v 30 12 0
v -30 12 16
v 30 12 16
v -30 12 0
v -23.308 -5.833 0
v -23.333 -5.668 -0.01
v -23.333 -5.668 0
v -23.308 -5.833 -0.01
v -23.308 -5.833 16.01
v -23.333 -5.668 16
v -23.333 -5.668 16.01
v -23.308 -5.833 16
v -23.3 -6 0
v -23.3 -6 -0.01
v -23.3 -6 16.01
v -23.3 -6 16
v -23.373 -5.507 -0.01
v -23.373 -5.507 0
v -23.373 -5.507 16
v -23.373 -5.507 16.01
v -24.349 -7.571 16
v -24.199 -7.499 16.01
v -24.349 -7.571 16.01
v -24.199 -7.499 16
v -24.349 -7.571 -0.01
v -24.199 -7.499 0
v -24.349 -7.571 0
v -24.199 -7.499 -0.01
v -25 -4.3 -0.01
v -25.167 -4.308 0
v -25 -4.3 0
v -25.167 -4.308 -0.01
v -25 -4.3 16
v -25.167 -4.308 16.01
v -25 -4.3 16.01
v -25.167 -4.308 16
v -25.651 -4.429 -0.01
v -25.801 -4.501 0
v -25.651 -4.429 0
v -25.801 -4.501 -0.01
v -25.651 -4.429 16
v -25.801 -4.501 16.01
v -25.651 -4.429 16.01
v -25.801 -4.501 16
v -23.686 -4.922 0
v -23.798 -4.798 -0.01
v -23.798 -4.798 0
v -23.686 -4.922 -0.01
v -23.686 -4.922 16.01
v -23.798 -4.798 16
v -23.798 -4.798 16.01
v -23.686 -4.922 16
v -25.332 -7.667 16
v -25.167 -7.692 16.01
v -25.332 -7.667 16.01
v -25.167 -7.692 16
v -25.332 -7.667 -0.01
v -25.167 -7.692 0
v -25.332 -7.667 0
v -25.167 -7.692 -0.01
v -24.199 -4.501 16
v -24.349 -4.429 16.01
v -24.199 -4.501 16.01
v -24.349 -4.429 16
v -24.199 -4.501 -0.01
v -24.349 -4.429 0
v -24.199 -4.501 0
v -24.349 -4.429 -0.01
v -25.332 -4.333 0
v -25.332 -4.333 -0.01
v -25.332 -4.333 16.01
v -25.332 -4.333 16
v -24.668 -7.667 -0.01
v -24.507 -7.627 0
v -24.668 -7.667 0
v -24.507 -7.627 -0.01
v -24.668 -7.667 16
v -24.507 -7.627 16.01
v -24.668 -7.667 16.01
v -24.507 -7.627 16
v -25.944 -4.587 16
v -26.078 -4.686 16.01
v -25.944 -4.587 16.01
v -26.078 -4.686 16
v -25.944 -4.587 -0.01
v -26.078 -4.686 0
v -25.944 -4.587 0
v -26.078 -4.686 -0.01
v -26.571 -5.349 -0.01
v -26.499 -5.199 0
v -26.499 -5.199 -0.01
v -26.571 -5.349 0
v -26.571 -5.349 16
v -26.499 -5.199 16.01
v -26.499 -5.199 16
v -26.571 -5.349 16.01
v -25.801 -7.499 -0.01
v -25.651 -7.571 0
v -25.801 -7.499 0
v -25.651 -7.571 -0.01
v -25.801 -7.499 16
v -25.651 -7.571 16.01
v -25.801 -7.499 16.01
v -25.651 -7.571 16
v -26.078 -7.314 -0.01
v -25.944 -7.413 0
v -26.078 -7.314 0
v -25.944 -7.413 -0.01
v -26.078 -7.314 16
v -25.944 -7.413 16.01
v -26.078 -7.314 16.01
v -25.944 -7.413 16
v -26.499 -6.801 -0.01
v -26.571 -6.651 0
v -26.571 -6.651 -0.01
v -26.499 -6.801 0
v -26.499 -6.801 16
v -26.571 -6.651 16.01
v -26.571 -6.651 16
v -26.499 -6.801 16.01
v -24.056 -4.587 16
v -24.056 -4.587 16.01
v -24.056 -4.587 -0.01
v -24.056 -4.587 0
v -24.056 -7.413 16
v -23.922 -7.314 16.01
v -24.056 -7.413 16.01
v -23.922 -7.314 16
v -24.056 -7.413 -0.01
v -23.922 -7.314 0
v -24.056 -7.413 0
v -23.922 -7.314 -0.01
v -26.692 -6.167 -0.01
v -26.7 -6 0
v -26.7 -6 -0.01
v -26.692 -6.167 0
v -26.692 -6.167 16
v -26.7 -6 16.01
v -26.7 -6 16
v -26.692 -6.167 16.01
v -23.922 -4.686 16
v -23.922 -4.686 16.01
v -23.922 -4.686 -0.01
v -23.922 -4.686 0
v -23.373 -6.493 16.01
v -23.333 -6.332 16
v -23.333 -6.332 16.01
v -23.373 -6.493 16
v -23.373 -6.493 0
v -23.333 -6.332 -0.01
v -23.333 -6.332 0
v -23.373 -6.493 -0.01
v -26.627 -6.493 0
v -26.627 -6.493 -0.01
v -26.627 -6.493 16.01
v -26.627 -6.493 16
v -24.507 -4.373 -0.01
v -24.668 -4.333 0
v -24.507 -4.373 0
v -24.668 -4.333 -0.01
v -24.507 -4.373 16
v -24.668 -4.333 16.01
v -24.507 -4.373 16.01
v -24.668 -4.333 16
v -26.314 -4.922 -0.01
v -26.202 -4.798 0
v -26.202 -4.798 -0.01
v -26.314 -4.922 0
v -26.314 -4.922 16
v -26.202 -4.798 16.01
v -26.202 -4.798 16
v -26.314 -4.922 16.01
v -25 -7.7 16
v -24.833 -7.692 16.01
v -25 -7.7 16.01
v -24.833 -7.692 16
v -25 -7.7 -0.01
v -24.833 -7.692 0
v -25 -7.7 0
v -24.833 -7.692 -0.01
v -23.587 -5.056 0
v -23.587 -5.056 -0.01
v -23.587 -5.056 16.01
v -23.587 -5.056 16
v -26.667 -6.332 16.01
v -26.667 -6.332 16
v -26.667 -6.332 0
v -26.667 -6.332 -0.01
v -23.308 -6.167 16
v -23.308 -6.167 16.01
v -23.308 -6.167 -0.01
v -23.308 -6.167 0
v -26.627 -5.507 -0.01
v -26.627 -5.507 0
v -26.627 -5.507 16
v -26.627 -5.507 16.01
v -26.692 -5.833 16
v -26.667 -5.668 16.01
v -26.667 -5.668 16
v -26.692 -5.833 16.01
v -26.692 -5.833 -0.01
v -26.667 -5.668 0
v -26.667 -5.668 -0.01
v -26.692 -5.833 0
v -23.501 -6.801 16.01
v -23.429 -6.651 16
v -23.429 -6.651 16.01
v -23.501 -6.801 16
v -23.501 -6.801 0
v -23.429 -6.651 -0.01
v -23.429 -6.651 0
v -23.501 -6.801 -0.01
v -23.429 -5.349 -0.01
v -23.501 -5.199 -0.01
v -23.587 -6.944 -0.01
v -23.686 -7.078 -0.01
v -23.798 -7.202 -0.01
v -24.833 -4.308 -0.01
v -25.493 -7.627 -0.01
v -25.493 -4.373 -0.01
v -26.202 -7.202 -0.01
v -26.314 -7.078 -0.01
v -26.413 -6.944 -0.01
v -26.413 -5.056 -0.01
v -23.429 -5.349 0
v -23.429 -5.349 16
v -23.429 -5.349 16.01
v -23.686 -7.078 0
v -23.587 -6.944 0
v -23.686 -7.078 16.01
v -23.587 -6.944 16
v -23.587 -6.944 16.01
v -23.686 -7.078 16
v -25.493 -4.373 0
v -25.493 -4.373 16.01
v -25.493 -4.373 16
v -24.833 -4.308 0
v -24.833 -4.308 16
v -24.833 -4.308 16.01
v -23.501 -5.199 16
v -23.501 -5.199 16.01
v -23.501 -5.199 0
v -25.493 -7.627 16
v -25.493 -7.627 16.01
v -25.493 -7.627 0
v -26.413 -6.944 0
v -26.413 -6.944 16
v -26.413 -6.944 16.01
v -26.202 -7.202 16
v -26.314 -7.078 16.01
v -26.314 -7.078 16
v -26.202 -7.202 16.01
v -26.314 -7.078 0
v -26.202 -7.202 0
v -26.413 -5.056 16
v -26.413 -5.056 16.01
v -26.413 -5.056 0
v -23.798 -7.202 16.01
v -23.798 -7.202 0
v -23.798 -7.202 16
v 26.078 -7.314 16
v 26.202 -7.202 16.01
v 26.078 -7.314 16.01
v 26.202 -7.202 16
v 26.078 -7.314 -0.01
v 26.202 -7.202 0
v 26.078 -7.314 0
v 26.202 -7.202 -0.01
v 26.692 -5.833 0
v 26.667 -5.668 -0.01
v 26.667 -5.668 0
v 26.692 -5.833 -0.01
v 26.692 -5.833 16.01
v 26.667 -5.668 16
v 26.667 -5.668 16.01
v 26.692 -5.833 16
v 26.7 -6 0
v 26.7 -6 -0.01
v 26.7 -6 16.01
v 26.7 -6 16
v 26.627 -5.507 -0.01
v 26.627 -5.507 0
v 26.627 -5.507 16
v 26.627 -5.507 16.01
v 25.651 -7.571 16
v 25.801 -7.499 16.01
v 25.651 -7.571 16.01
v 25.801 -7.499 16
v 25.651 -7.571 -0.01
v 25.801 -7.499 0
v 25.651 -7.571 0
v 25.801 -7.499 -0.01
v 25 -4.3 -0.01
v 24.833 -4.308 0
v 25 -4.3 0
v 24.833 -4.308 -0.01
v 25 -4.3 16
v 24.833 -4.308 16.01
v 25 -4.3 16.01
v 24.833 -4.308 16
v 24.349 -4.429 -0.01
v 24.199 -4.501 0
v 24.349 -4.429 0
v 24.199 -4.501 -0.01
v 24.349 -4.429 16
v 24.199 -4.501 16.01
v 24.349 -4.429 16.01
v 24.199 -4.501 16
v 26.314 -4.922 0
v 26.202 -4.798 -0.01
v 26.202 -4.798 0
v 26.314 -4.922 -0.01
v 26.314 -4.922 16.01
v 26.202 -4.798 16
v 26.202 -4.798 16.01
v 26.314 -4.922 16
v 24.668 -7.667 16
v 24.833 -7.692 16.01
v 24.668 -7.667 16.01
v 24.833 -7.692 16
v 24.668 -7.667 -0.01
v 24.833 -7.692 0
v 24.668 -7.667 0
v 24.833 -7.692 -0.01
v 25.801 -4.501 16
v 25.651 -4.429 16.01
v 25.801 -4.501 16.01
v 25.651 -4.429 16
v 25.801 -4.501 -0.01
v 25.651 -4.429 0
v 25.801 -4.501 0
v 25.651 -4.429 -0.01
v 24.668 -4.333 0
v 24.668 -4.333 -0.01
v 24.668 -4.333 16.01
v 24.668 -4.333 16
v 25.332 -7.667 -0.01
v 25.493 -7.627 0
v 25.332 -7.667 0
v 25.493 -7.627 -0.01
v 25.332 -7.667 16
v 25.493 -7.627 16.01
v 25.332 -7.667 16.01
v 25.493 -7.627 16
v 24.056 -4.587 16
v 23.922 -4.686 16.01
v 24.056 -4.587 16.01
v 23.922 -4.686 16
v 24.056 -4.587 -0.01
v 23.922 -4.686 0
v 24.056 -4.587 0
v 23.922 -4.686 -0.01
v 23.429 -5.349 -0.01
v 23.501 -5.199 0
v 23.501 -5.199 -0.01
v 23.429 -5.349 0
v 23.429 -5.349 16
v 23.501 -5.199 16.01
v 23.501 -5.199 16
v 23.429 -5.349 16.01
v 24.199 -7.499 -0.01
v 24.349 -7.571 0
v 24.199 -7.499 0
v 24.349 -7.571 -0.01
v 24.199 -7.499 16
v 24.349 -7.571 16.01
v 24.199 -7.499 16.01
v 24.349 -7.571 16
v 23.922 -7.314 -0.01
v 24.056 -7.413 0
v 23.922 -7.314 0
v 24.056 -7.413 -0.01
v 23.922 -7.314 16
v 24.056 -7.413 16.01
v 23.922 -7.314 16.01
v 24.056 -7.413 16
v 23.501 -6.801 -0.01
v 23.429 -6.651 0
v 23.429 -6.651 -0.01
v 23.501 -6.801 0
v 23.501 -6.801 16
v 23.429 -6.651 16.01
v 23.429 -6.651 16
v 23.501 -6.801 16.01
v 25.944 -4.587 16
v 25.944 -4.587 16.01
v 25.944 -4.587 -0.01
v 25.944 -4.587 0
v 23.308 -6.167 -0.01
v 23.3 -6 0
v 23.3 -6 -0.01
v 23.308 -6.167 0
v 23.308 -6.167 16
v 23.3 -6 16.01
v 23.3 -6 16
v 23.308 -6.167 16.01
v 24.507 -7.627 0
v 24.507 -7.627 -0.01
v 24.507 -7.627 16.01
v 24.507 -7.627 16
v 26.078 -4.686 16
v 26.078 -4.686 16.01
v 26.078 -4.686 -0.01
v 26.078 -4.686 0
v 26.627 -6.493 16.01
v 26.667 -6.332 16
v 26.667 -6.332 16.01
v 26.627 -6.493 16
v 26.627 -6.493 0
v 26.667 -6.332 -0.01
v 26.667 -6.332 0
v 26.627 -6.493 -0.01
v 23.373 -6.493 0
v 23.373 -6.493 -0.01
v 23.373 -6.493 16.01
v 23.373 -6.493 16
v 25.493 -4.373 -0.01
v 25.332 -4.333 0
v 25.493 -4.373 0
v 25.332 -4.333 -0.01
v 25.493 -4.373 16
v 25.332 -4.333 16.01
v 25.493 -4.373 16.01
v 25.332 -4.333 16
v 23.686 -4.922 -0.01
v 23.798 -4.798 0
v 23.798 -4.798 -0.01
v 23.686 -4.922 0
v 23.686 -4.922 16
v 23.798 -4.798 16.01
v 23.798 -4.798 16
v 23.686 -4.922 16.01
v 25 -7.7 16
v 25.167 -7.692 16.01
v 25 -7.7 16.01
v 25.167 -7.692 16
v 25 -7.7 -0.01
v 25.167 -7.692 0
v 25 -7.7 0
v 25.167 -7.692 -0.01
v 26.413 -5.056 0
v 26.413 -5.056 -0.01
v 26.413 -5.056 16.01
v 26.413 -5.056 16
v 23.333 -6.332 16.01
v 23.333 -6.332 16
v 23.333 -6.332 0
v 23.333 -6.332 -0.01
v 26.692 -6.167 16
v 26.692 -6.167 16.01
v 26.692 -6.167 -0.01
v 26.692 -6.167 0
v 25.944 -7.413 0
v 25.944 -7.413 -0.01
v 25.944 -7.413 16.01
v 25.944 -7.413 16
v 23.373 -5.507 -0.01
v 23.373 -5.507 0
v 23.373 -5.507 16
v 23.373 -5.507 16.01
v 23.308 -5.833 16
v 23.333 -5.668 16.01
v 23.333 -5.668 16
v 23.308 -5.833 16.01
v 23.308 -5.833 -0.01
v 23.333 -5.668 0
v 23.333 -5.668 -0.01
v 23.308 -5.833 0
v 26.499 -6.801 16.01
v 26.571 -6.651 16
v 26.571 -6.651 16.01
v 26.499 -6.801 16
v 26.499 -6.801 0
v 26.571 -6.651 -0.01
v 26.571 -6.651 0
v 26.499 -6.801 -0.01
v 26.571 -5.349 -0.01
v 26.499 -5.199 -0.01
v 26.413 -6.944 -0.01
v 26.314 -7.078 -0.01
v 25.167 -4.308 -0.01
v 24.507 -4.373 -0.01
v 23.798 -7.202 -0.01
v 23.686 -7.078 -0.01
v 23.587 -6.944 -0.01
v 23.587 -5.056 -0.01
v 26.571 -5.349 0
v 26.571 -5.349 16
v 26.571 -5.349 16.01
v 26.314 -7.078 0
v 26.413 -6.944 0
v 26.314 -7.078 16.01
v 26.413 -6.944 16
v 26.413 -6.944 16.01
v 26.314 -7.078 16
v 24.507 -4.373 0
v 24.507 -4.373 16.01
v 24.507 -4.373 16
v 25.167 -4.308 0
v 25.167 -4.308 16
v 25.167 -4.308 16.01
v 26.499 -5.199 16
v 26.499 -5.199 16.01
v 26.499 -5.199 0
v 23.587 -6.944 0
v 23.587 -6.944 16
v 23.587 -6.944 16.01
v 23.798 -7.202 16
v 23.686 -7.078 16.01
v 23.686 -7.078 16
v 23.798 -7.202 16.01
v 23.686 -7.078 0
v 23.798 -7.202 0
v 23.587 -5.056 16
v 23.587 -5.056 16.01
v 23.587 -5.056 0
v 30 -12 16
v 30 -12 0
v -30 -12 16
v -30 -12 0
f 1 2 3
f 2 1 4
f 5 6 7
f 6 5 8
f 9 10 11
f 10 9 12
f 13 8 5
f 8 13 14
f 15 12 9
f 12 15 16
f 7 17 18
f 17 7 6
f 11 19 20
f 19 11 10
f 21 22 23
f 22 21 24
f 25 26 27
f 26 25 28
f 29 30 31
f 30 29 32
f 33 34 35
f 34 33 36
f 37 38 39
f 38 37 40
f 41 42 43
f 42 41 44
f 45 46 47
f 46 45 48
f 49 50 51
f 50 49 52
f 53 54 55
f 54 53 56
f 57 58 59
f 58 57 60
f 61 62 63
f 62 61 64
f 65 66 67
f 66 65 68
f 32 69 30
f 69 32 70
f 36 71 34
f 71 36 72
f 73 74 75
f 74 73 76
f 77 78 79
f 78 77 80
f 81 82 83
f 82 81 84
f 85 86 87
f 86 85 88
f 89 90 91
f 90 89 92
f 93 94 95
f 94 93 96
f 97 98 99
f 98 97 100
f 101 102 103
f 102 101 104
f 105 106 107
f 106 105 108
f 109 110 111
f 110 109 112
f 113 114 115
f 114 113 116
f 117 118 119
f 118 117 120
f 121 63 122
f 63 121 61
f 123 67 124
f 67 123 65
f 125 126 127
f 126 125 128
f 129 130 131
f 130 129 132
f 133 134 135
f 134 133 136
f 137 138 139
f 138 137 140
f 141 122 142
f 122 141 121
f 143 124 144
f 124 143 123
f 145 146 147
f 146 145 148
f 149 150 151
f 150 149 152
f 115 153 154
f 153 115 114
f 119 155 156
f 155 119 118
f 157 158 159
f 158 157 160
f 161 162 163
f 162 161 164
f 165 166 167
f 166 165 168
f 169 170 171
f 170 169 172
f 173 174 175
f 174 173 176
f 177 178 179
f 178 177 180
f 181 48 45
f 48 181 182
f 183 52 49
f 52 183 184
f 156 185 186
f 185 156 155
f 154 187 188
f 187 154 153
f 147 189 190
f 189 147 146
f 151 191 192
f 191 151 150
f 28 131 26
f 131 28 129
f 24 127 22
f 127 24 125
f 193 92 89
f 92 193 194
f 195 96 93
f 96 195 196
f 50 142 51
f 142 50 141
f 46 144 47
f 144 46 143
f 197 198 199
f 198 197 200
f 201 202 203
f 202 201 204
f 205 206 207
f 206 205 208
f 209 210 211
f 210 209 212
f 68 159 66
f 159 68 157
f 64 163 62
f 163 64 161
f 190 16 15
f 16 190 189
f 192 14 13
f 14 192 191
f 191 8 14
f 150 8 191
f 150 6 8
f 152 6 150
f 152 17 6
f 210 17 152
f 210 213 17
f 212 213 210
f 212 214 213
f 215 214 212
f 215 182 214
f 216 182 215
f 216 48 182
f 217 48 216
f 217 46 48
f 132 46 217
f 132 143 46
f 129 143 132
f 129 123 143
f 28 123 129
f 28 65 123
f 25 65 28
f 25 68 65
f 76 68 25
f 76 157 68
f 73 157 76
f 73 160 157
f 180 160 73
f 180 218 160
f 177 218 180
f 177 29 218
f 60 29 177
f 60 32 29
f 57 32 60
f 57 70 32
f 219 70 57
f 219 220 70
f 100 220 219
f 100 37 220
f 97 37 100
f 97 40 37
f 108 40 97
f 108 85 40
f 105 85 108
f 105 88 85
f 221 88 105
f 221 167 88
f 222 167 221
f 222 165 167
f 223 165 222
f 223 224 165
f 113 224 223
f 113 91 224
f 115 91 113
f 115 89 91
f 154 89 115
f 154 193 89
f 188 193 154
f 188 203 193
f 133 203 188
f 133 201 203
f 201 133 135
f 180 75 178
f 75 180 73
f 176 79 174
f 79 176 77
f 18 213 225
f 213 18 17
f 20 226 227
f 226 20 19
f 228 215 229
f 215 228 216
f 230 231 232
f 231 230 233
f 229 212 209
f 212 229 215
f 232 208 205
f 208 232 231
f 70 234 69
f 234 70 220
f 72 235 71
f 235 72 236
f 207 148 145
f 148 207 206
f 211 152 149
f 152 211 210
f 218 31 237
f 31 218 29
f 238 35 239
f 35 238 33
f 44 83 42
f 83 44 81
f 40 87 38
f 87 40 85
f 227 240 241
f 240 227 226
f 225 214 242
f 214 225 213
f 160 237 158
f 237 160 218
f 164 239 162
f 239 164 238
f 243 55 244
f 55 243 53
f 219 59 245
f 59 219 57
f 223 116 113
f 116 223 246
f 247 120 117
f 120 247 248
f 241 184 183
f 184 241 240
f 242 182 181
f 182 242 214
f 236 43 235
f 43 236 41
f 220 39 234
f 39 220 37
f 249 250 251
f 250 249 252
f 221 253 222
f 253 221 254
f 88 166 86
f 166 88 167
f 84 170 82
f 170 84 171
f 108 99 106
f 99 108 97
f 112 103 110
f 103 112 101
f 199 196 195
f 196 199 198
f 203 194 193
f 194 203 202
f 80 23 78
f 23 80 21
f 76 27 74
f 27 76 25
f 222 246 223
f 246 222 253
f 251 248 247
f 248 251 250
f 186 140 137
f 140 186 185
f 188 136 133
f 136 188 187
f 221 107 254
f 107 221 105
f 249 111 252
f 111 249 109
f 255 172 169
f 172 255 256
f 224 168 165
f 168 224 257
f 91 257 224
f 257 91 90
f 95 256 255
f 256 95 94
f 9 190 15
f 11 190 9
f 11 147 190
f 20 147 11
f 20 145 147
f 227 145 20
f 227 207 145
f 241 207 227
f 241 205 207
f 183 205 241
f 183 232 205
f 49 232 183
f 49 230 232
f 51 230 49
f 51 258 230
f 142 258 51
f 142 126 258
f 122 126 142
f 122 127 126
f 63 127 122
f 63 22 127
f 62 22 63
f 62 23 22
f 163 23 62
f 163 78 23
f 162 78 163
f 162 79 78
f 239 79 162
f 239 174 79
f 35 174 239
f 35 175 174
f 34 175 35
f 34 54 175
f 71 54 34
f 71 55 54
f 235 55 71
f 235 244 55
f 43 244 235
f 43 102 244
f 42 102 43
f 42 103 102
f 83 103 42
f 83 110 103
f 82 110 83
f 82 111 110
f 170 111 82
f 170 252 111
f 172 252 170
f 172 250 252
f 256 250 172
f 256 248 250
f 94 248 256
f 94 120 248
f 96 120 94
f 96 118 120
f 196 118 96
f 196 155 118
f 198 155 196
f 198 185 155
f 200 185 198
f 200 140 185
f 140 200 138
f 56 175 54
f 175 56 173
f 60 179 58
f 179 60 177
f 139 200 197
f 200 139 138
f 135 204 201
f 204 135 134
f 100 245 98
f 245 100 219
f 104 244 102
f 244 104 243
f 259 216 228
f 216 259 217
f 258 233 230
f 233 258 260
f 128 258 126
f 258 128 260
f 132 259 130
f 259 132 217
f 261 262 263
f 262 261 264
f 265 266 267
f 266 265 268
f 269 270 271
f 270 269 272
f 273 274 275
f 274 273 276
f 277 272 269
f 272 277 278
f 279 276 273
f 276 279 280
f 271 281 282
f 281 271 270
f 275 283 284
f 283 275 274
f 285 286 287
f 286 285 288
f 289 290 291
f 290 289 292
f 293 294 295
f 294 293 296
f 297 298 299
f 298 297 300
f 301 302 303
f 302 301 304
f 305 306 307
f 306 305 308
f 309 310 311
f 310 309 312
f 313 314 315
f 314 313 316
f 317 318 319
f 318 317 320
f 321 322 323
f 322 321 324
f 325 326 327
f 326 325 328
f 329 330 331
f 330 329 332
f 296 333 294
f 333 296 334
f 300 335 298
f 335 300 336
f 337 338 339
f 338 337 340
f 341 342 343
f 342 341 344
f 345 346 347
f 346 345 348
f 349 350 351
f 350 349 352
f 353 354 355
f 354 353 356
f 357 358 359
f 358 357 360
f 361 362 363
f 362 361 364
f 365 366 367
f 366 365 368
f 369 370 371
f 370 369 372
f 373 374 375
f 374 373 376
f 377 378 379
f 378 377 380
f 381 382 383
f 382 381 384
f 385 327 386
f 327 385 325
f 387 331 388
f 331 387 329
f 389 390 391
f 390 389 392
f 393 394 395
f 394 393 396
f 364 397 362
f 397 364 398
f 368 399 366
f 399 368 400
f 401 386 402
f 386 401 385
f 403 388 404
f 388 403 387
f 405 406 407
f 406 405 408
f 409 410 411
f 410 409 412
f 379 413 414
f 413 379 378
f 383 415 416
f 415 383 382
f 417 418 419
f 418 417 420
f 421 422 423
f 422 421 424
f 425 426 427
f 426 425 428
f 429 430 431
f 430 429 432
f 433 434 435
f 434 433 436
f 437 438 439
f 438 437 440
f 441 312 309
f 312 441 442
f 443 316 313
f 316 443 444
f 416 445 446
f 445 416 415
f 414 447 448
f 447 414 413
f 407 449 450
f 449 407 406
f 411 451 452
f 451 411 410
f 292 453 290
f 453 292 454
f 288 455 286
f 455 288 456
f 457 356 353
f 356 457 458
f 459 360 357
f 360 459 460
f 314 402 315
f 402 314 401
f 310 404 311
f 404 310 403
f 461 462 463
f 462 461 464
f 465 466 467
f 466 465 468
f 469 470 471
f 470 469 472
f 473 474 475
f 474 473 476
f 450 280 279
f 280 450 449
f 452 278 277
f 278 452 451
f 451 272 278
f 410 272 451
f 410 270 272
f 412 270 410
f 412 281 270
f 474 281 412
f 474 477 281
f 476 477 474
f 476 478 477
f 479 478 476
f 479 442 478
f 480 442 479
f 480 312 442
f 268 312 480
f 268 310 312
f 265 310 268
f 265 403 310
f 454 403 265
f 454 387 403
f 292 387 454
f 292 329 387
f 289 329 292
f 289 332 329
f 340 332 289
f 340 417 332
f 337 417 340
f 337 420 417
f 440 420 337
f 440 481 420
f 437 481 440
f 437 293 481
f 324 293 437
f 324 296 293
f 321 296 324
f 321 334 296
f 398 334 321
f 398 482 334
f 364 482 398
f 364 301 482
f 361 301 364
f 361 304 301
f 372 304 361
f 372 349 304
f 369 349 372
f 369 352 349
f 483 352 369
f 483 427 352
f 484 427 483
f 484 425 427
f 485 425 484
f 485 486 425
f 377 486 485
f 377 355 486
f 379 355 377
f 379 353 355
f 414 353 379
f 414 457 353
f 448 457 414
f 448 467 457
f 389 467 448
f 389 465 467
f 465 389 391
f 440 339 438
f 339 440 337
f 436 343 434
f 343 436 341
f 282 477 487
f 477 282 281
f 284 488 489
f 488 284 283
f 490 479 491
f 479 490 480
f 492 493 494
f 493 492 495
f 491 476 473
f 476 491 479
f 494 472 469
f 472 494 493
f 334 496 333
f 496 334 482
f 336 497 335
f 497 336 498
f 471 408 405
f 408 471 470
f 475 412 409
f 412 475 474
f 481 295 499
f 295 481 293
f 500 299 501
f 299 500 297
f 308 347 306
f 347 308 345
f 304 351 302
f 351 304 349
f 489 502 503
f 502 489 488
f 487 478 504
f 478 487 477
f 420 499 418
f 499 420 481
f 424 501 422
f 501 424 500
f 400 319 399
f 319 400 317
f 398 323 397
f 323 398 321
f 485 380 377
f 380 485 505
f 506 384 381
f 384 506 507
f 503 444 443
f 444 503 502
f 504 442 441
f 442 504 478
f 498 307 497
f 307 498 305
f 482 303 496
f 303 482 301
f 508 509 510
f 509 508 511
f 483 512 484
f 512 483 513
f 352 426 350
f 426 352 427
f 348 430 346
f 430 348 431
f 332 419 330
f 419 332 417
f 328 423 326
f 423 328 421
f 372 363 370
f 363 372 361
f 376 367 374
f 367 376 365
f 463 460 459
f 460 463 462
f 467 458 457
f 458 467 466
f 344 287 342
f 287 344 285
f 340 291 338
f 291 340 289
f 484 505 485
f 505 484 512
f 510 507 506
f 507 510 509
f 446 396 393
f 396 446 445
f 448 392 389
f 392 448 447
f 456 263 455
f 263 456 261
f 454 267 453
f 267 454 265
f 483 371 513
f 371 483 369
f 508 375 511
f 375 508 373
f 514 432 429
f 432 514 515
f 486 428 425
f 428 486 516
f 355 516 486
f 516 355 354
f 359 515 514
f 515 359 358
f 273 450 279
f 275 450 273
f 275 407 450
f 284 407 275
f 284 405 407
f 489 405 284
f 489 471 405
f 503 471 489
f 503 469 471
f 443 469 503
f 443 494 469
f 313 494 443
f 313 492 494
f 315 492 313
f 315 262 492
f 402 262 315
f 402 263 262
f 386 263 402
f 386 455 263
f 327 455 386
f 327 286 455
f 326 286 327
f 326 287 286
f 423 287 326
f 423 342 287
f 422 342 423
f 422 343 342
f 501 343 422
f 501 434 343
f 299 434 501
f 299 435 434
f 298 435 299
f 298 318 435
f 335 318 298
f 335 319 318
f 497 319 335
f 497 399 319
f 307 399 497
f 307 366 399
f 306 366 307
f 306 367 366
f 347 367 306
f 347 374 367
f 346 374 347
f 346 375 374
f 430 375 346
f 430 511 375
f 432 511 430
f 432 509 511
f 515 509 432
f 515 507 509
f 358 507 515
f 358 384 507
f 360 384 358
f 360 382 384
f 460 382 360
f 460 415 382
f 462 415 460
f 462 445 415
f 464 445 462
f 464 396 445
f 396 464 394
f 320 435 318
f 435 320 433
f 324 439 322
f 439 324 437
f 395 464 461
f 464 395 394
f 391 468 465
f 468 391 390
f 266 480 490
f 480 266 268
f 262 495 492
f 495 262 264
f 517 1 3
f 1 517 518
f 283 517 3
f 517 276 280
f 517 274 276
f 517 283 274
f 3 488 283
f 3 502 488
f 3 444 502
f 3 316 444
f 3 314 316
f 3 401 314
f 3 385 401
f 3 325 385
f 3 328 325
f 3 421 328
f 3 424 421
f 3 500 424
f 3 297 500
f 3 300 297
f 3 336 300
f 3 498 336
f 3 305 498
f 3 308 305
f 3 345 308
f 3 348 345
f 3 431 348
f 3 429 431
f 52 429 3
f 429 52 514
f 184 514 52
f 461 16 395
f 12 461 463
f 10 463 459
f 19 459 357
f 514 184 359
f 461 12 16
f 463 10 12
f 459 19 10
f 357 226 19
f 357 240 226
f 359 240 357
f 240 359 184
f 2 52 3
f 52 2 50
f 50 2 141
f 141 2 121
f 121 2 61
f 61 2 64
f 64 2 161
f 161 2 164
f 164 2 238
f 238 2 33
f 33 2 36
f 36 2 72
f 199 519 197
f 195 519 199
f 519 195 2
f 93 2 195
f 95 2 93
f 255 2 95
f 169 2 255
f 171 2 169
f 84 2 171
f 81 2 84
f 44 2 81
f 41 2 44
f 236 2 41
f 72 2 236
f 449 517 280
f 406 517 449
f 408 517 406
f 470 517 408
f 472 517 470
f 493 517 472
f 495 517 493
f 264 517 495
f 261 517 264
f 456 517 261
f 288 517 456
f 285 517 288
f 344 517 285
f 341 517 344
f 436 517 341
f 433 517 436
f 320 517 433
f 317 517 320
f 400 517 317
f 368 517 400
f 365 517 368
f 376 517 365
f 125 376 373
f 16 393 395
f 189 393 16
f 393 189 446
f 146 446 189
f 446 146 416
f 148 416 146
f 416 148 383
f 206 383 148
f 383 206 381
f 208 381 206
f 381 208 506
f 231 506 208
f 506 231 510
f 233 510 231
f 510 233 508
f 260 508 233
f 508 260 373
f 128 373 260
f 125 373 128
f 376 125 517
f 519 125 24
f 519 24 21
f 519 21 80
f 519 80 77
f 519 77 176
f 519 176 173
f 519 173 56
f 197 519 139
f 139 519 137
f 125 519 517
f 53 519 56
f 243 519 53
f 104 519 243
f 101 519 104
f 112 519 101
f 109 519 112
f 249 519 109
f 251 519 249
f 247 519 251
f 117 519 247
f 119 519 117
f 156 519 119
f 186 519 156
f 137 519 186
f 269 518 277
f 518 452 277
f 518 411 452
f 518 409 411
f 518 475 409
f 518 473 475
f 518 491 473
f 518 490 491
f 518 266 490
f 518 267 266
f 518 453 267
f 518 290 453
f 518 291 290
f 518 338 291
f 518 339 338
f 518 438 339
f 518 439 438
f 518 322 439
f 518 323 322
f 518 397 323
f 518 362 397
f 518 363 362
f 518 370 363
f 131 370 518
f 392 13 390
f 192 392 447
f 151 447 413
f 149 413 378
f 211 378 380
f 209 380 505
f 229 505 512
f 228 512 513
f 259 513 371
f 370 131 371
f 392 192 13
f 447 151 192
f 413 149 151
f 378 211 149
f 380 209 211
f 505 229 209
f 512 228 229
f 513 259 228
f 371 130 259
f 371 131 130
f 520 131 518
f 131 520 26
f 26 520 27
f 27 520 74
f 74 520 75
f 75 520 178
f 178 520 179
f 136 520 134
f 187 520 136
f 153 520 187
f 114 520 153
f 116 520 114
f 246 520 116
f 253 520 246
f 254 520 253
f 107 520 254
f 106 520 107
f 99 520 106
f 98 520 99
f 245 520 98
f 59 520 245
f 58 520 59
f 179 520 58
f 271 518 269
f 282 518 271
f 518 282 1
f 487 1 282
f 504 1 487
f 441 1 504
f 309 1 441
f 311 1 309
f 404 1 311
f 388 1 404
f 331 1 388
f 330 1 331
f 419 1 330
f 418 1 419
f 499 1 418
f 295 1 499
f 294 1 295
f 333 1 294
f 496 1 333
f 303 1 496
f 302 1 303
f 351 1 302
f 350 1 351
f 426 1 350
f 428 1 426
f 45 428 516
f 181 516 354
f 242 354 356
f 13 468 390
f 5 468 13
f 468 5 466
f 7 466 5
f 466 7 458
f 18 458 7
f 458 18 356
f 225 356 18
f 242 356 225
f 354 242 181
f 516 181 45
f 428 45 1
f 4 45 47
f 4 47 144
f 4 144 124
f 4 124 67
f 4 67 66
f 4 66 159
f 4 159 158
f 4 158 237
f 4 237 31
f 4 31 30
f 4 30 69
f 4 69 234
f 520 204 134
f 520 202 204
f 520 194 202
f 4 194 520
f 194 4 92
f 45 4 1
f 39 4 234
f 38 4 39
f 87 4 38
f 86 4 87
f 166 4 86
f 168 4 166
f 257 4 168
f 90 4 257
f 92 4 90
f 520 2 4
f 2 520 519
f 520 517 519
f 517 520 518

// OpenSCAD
// Manifold Block: 1-to-3 Splitter
// Dimensions measured in mm

// Block dimensions
block_len = 60;   // X
block_wid = 24;   // Y
block_hgt = 16;   // Z

// Channel geometry
channel_dia = 3;  // Internal channel diameter
mid_z = 8;        // Mid-plane height (z)

// Inlet socket (on -X face)
inlet_socket_dia = 4.2;
inlet_socket_depth = 8;
inlet_socket_y = 0;   // Centered in Y on the -X face
inlet_socket_x = -block_len/2; // On the -X face

// Main channel extent
main_channel_start_x = -block_len/2; // Starts at inlet
main_channel_end_x = 15;             // Stops inside block

// Outlet branches
outlet_branch_x_positions = [-15, 0, 15];
outlet_socket_dia = 4.2;
outlet_socket_depth = 6;
outlet_socket_y = block_wid/2; // On the +Y face

// Mounting holes
mount_hole_dia = 3.4;
mount_hole_x_positions = [-25, 25];
mount_hole_y = -6;

$fn = 64;

// Main block
translate([-block_len/2, -block_wid/2, 0])
  cube([block_len, block_wid, block_hgt]);

// --- Channels and Sockets ---

// Helper module to create a cylindrical channel/socket
// pos: [x, y, z] center
// dir: direction vector [dx, dy, dz]
// length: length of cylinder
// dia: diameter
module cyl_channel(pos, dir, length, dia) {
  translate(pos)
    rotate([90, 0, 0]) // Default is along Z, we'll rotate as needed
    rotate(v=[0,0,0], a=0) // Placeholder
    cylinder(h=length, r=dia/2, center=false);
}

// Better approach: use rotate_extrude or just rotate the cylinder appropriately.
// Since all channels are horizontal (along X or Y), we can rotate cylinders 90 deg.

// Inlet Socket (on -X face, pointing in +X)
translate([inlet_socket_x, inlet_socket_y, mid_z])
  rotate([0, 90, 0]) // Pointing along +X
  cylinder(h=inlet_socket_depth, r=inlet_socket_dia/2, center=false);

// Main Channel (along +X from inlet to x=15)
// Starts at inlet_socket_x + inlet_socket_depth? No, the socket is the start.
// The channel runs from the end of the socket to x=15.
// Actually, the socket is a counterbore. The channel is the 3mm bore.
// Let's model the 3mm channel first, then the sockets as larger bores.

// Main 3mm channel: from x = inlet_socket_x to x = main_channel_end_x
// Length = main_channel_end_x - inlet_socket_x
main_chan_len = main_channel_end_x - inlet_socket_x;
main_chan_start_pos = [inlet_socket_x + inlet_socket_depth/2, inlet_socket_y, mid_z]; 
// Wait, the socket is 8mm deep. The channel should start where the socket ends? 
// Or is the socket just an enlargement at the end? 
// "4.2 mm socket 8 mm deep for 4 mm tubing; from it the main channel runs..."
// This implies the socket is the termination feature. The 3mm channel runs from the 
// back of the socket to x=15.
// So 3mm channel starts at x = inlet_socket_x + inlet_socket_depth.
main_chan_3mm_start_x = inlet_socket_x + inlet_socket_depth;
main_chan_3mm_len = main_channel_end_x - main_chan_3mm_start_x;

translate([main_chan_3mm_start_x + main_chan_3mm_len/2, inlet_socket_y, mid_z])
  rotate([0, 90, 0])
  cylinder(h=main_chan_3mm_len, r=channel_dia/2, center=true);

// Outlet Branches (3mm channels)
// Each branch goes from the main channel (at specific x) to the +Y face.
// The main channel is at y = inlet_socket_y = 0.
// The outlet socket is at y = block_wid/2.
// So the 3mm channel runs from y=0 to y=(block_wid/2 - outlet_socket_depth).
// And the socket is the last part.

for (bx = outlet_branch_x_positions) {
  // 3mm channel
  branch_len = (block_wid/2 - outlet_socket_depth) - 0; // From y=0 to start of socket
  branch_center_y = 0 + branch_len/2;
  
  translate([bx, branch_center_y, mid_z])
    rotate([90, 0, 0]) // Pointing along +Y
    cylinder(h=branch_len, r=channel_dia/2, center=true);
    
  // Outlet Socket (4.2mm, 6mm deep) at +Y face
  socket_center_y = block_wid/2 - outlet_socket_depth/2;
  translate([bx, socket_center_y, mid_z])
    rotate([90, 0, 0])
    cylinder(h=outlet_socket_depth, r=outlet_socket_dia/2, center=true);
}

// --- Mounting Holes ---
for (mx = mount_hole_x_positions) {
  translate([mx, mount_hole_y, block_hgt/2])
    cylinder(h=block_hgt + 0.02, r=mount_hole_dia/2, center=true); // +0.02 to ensure through-hole
}
